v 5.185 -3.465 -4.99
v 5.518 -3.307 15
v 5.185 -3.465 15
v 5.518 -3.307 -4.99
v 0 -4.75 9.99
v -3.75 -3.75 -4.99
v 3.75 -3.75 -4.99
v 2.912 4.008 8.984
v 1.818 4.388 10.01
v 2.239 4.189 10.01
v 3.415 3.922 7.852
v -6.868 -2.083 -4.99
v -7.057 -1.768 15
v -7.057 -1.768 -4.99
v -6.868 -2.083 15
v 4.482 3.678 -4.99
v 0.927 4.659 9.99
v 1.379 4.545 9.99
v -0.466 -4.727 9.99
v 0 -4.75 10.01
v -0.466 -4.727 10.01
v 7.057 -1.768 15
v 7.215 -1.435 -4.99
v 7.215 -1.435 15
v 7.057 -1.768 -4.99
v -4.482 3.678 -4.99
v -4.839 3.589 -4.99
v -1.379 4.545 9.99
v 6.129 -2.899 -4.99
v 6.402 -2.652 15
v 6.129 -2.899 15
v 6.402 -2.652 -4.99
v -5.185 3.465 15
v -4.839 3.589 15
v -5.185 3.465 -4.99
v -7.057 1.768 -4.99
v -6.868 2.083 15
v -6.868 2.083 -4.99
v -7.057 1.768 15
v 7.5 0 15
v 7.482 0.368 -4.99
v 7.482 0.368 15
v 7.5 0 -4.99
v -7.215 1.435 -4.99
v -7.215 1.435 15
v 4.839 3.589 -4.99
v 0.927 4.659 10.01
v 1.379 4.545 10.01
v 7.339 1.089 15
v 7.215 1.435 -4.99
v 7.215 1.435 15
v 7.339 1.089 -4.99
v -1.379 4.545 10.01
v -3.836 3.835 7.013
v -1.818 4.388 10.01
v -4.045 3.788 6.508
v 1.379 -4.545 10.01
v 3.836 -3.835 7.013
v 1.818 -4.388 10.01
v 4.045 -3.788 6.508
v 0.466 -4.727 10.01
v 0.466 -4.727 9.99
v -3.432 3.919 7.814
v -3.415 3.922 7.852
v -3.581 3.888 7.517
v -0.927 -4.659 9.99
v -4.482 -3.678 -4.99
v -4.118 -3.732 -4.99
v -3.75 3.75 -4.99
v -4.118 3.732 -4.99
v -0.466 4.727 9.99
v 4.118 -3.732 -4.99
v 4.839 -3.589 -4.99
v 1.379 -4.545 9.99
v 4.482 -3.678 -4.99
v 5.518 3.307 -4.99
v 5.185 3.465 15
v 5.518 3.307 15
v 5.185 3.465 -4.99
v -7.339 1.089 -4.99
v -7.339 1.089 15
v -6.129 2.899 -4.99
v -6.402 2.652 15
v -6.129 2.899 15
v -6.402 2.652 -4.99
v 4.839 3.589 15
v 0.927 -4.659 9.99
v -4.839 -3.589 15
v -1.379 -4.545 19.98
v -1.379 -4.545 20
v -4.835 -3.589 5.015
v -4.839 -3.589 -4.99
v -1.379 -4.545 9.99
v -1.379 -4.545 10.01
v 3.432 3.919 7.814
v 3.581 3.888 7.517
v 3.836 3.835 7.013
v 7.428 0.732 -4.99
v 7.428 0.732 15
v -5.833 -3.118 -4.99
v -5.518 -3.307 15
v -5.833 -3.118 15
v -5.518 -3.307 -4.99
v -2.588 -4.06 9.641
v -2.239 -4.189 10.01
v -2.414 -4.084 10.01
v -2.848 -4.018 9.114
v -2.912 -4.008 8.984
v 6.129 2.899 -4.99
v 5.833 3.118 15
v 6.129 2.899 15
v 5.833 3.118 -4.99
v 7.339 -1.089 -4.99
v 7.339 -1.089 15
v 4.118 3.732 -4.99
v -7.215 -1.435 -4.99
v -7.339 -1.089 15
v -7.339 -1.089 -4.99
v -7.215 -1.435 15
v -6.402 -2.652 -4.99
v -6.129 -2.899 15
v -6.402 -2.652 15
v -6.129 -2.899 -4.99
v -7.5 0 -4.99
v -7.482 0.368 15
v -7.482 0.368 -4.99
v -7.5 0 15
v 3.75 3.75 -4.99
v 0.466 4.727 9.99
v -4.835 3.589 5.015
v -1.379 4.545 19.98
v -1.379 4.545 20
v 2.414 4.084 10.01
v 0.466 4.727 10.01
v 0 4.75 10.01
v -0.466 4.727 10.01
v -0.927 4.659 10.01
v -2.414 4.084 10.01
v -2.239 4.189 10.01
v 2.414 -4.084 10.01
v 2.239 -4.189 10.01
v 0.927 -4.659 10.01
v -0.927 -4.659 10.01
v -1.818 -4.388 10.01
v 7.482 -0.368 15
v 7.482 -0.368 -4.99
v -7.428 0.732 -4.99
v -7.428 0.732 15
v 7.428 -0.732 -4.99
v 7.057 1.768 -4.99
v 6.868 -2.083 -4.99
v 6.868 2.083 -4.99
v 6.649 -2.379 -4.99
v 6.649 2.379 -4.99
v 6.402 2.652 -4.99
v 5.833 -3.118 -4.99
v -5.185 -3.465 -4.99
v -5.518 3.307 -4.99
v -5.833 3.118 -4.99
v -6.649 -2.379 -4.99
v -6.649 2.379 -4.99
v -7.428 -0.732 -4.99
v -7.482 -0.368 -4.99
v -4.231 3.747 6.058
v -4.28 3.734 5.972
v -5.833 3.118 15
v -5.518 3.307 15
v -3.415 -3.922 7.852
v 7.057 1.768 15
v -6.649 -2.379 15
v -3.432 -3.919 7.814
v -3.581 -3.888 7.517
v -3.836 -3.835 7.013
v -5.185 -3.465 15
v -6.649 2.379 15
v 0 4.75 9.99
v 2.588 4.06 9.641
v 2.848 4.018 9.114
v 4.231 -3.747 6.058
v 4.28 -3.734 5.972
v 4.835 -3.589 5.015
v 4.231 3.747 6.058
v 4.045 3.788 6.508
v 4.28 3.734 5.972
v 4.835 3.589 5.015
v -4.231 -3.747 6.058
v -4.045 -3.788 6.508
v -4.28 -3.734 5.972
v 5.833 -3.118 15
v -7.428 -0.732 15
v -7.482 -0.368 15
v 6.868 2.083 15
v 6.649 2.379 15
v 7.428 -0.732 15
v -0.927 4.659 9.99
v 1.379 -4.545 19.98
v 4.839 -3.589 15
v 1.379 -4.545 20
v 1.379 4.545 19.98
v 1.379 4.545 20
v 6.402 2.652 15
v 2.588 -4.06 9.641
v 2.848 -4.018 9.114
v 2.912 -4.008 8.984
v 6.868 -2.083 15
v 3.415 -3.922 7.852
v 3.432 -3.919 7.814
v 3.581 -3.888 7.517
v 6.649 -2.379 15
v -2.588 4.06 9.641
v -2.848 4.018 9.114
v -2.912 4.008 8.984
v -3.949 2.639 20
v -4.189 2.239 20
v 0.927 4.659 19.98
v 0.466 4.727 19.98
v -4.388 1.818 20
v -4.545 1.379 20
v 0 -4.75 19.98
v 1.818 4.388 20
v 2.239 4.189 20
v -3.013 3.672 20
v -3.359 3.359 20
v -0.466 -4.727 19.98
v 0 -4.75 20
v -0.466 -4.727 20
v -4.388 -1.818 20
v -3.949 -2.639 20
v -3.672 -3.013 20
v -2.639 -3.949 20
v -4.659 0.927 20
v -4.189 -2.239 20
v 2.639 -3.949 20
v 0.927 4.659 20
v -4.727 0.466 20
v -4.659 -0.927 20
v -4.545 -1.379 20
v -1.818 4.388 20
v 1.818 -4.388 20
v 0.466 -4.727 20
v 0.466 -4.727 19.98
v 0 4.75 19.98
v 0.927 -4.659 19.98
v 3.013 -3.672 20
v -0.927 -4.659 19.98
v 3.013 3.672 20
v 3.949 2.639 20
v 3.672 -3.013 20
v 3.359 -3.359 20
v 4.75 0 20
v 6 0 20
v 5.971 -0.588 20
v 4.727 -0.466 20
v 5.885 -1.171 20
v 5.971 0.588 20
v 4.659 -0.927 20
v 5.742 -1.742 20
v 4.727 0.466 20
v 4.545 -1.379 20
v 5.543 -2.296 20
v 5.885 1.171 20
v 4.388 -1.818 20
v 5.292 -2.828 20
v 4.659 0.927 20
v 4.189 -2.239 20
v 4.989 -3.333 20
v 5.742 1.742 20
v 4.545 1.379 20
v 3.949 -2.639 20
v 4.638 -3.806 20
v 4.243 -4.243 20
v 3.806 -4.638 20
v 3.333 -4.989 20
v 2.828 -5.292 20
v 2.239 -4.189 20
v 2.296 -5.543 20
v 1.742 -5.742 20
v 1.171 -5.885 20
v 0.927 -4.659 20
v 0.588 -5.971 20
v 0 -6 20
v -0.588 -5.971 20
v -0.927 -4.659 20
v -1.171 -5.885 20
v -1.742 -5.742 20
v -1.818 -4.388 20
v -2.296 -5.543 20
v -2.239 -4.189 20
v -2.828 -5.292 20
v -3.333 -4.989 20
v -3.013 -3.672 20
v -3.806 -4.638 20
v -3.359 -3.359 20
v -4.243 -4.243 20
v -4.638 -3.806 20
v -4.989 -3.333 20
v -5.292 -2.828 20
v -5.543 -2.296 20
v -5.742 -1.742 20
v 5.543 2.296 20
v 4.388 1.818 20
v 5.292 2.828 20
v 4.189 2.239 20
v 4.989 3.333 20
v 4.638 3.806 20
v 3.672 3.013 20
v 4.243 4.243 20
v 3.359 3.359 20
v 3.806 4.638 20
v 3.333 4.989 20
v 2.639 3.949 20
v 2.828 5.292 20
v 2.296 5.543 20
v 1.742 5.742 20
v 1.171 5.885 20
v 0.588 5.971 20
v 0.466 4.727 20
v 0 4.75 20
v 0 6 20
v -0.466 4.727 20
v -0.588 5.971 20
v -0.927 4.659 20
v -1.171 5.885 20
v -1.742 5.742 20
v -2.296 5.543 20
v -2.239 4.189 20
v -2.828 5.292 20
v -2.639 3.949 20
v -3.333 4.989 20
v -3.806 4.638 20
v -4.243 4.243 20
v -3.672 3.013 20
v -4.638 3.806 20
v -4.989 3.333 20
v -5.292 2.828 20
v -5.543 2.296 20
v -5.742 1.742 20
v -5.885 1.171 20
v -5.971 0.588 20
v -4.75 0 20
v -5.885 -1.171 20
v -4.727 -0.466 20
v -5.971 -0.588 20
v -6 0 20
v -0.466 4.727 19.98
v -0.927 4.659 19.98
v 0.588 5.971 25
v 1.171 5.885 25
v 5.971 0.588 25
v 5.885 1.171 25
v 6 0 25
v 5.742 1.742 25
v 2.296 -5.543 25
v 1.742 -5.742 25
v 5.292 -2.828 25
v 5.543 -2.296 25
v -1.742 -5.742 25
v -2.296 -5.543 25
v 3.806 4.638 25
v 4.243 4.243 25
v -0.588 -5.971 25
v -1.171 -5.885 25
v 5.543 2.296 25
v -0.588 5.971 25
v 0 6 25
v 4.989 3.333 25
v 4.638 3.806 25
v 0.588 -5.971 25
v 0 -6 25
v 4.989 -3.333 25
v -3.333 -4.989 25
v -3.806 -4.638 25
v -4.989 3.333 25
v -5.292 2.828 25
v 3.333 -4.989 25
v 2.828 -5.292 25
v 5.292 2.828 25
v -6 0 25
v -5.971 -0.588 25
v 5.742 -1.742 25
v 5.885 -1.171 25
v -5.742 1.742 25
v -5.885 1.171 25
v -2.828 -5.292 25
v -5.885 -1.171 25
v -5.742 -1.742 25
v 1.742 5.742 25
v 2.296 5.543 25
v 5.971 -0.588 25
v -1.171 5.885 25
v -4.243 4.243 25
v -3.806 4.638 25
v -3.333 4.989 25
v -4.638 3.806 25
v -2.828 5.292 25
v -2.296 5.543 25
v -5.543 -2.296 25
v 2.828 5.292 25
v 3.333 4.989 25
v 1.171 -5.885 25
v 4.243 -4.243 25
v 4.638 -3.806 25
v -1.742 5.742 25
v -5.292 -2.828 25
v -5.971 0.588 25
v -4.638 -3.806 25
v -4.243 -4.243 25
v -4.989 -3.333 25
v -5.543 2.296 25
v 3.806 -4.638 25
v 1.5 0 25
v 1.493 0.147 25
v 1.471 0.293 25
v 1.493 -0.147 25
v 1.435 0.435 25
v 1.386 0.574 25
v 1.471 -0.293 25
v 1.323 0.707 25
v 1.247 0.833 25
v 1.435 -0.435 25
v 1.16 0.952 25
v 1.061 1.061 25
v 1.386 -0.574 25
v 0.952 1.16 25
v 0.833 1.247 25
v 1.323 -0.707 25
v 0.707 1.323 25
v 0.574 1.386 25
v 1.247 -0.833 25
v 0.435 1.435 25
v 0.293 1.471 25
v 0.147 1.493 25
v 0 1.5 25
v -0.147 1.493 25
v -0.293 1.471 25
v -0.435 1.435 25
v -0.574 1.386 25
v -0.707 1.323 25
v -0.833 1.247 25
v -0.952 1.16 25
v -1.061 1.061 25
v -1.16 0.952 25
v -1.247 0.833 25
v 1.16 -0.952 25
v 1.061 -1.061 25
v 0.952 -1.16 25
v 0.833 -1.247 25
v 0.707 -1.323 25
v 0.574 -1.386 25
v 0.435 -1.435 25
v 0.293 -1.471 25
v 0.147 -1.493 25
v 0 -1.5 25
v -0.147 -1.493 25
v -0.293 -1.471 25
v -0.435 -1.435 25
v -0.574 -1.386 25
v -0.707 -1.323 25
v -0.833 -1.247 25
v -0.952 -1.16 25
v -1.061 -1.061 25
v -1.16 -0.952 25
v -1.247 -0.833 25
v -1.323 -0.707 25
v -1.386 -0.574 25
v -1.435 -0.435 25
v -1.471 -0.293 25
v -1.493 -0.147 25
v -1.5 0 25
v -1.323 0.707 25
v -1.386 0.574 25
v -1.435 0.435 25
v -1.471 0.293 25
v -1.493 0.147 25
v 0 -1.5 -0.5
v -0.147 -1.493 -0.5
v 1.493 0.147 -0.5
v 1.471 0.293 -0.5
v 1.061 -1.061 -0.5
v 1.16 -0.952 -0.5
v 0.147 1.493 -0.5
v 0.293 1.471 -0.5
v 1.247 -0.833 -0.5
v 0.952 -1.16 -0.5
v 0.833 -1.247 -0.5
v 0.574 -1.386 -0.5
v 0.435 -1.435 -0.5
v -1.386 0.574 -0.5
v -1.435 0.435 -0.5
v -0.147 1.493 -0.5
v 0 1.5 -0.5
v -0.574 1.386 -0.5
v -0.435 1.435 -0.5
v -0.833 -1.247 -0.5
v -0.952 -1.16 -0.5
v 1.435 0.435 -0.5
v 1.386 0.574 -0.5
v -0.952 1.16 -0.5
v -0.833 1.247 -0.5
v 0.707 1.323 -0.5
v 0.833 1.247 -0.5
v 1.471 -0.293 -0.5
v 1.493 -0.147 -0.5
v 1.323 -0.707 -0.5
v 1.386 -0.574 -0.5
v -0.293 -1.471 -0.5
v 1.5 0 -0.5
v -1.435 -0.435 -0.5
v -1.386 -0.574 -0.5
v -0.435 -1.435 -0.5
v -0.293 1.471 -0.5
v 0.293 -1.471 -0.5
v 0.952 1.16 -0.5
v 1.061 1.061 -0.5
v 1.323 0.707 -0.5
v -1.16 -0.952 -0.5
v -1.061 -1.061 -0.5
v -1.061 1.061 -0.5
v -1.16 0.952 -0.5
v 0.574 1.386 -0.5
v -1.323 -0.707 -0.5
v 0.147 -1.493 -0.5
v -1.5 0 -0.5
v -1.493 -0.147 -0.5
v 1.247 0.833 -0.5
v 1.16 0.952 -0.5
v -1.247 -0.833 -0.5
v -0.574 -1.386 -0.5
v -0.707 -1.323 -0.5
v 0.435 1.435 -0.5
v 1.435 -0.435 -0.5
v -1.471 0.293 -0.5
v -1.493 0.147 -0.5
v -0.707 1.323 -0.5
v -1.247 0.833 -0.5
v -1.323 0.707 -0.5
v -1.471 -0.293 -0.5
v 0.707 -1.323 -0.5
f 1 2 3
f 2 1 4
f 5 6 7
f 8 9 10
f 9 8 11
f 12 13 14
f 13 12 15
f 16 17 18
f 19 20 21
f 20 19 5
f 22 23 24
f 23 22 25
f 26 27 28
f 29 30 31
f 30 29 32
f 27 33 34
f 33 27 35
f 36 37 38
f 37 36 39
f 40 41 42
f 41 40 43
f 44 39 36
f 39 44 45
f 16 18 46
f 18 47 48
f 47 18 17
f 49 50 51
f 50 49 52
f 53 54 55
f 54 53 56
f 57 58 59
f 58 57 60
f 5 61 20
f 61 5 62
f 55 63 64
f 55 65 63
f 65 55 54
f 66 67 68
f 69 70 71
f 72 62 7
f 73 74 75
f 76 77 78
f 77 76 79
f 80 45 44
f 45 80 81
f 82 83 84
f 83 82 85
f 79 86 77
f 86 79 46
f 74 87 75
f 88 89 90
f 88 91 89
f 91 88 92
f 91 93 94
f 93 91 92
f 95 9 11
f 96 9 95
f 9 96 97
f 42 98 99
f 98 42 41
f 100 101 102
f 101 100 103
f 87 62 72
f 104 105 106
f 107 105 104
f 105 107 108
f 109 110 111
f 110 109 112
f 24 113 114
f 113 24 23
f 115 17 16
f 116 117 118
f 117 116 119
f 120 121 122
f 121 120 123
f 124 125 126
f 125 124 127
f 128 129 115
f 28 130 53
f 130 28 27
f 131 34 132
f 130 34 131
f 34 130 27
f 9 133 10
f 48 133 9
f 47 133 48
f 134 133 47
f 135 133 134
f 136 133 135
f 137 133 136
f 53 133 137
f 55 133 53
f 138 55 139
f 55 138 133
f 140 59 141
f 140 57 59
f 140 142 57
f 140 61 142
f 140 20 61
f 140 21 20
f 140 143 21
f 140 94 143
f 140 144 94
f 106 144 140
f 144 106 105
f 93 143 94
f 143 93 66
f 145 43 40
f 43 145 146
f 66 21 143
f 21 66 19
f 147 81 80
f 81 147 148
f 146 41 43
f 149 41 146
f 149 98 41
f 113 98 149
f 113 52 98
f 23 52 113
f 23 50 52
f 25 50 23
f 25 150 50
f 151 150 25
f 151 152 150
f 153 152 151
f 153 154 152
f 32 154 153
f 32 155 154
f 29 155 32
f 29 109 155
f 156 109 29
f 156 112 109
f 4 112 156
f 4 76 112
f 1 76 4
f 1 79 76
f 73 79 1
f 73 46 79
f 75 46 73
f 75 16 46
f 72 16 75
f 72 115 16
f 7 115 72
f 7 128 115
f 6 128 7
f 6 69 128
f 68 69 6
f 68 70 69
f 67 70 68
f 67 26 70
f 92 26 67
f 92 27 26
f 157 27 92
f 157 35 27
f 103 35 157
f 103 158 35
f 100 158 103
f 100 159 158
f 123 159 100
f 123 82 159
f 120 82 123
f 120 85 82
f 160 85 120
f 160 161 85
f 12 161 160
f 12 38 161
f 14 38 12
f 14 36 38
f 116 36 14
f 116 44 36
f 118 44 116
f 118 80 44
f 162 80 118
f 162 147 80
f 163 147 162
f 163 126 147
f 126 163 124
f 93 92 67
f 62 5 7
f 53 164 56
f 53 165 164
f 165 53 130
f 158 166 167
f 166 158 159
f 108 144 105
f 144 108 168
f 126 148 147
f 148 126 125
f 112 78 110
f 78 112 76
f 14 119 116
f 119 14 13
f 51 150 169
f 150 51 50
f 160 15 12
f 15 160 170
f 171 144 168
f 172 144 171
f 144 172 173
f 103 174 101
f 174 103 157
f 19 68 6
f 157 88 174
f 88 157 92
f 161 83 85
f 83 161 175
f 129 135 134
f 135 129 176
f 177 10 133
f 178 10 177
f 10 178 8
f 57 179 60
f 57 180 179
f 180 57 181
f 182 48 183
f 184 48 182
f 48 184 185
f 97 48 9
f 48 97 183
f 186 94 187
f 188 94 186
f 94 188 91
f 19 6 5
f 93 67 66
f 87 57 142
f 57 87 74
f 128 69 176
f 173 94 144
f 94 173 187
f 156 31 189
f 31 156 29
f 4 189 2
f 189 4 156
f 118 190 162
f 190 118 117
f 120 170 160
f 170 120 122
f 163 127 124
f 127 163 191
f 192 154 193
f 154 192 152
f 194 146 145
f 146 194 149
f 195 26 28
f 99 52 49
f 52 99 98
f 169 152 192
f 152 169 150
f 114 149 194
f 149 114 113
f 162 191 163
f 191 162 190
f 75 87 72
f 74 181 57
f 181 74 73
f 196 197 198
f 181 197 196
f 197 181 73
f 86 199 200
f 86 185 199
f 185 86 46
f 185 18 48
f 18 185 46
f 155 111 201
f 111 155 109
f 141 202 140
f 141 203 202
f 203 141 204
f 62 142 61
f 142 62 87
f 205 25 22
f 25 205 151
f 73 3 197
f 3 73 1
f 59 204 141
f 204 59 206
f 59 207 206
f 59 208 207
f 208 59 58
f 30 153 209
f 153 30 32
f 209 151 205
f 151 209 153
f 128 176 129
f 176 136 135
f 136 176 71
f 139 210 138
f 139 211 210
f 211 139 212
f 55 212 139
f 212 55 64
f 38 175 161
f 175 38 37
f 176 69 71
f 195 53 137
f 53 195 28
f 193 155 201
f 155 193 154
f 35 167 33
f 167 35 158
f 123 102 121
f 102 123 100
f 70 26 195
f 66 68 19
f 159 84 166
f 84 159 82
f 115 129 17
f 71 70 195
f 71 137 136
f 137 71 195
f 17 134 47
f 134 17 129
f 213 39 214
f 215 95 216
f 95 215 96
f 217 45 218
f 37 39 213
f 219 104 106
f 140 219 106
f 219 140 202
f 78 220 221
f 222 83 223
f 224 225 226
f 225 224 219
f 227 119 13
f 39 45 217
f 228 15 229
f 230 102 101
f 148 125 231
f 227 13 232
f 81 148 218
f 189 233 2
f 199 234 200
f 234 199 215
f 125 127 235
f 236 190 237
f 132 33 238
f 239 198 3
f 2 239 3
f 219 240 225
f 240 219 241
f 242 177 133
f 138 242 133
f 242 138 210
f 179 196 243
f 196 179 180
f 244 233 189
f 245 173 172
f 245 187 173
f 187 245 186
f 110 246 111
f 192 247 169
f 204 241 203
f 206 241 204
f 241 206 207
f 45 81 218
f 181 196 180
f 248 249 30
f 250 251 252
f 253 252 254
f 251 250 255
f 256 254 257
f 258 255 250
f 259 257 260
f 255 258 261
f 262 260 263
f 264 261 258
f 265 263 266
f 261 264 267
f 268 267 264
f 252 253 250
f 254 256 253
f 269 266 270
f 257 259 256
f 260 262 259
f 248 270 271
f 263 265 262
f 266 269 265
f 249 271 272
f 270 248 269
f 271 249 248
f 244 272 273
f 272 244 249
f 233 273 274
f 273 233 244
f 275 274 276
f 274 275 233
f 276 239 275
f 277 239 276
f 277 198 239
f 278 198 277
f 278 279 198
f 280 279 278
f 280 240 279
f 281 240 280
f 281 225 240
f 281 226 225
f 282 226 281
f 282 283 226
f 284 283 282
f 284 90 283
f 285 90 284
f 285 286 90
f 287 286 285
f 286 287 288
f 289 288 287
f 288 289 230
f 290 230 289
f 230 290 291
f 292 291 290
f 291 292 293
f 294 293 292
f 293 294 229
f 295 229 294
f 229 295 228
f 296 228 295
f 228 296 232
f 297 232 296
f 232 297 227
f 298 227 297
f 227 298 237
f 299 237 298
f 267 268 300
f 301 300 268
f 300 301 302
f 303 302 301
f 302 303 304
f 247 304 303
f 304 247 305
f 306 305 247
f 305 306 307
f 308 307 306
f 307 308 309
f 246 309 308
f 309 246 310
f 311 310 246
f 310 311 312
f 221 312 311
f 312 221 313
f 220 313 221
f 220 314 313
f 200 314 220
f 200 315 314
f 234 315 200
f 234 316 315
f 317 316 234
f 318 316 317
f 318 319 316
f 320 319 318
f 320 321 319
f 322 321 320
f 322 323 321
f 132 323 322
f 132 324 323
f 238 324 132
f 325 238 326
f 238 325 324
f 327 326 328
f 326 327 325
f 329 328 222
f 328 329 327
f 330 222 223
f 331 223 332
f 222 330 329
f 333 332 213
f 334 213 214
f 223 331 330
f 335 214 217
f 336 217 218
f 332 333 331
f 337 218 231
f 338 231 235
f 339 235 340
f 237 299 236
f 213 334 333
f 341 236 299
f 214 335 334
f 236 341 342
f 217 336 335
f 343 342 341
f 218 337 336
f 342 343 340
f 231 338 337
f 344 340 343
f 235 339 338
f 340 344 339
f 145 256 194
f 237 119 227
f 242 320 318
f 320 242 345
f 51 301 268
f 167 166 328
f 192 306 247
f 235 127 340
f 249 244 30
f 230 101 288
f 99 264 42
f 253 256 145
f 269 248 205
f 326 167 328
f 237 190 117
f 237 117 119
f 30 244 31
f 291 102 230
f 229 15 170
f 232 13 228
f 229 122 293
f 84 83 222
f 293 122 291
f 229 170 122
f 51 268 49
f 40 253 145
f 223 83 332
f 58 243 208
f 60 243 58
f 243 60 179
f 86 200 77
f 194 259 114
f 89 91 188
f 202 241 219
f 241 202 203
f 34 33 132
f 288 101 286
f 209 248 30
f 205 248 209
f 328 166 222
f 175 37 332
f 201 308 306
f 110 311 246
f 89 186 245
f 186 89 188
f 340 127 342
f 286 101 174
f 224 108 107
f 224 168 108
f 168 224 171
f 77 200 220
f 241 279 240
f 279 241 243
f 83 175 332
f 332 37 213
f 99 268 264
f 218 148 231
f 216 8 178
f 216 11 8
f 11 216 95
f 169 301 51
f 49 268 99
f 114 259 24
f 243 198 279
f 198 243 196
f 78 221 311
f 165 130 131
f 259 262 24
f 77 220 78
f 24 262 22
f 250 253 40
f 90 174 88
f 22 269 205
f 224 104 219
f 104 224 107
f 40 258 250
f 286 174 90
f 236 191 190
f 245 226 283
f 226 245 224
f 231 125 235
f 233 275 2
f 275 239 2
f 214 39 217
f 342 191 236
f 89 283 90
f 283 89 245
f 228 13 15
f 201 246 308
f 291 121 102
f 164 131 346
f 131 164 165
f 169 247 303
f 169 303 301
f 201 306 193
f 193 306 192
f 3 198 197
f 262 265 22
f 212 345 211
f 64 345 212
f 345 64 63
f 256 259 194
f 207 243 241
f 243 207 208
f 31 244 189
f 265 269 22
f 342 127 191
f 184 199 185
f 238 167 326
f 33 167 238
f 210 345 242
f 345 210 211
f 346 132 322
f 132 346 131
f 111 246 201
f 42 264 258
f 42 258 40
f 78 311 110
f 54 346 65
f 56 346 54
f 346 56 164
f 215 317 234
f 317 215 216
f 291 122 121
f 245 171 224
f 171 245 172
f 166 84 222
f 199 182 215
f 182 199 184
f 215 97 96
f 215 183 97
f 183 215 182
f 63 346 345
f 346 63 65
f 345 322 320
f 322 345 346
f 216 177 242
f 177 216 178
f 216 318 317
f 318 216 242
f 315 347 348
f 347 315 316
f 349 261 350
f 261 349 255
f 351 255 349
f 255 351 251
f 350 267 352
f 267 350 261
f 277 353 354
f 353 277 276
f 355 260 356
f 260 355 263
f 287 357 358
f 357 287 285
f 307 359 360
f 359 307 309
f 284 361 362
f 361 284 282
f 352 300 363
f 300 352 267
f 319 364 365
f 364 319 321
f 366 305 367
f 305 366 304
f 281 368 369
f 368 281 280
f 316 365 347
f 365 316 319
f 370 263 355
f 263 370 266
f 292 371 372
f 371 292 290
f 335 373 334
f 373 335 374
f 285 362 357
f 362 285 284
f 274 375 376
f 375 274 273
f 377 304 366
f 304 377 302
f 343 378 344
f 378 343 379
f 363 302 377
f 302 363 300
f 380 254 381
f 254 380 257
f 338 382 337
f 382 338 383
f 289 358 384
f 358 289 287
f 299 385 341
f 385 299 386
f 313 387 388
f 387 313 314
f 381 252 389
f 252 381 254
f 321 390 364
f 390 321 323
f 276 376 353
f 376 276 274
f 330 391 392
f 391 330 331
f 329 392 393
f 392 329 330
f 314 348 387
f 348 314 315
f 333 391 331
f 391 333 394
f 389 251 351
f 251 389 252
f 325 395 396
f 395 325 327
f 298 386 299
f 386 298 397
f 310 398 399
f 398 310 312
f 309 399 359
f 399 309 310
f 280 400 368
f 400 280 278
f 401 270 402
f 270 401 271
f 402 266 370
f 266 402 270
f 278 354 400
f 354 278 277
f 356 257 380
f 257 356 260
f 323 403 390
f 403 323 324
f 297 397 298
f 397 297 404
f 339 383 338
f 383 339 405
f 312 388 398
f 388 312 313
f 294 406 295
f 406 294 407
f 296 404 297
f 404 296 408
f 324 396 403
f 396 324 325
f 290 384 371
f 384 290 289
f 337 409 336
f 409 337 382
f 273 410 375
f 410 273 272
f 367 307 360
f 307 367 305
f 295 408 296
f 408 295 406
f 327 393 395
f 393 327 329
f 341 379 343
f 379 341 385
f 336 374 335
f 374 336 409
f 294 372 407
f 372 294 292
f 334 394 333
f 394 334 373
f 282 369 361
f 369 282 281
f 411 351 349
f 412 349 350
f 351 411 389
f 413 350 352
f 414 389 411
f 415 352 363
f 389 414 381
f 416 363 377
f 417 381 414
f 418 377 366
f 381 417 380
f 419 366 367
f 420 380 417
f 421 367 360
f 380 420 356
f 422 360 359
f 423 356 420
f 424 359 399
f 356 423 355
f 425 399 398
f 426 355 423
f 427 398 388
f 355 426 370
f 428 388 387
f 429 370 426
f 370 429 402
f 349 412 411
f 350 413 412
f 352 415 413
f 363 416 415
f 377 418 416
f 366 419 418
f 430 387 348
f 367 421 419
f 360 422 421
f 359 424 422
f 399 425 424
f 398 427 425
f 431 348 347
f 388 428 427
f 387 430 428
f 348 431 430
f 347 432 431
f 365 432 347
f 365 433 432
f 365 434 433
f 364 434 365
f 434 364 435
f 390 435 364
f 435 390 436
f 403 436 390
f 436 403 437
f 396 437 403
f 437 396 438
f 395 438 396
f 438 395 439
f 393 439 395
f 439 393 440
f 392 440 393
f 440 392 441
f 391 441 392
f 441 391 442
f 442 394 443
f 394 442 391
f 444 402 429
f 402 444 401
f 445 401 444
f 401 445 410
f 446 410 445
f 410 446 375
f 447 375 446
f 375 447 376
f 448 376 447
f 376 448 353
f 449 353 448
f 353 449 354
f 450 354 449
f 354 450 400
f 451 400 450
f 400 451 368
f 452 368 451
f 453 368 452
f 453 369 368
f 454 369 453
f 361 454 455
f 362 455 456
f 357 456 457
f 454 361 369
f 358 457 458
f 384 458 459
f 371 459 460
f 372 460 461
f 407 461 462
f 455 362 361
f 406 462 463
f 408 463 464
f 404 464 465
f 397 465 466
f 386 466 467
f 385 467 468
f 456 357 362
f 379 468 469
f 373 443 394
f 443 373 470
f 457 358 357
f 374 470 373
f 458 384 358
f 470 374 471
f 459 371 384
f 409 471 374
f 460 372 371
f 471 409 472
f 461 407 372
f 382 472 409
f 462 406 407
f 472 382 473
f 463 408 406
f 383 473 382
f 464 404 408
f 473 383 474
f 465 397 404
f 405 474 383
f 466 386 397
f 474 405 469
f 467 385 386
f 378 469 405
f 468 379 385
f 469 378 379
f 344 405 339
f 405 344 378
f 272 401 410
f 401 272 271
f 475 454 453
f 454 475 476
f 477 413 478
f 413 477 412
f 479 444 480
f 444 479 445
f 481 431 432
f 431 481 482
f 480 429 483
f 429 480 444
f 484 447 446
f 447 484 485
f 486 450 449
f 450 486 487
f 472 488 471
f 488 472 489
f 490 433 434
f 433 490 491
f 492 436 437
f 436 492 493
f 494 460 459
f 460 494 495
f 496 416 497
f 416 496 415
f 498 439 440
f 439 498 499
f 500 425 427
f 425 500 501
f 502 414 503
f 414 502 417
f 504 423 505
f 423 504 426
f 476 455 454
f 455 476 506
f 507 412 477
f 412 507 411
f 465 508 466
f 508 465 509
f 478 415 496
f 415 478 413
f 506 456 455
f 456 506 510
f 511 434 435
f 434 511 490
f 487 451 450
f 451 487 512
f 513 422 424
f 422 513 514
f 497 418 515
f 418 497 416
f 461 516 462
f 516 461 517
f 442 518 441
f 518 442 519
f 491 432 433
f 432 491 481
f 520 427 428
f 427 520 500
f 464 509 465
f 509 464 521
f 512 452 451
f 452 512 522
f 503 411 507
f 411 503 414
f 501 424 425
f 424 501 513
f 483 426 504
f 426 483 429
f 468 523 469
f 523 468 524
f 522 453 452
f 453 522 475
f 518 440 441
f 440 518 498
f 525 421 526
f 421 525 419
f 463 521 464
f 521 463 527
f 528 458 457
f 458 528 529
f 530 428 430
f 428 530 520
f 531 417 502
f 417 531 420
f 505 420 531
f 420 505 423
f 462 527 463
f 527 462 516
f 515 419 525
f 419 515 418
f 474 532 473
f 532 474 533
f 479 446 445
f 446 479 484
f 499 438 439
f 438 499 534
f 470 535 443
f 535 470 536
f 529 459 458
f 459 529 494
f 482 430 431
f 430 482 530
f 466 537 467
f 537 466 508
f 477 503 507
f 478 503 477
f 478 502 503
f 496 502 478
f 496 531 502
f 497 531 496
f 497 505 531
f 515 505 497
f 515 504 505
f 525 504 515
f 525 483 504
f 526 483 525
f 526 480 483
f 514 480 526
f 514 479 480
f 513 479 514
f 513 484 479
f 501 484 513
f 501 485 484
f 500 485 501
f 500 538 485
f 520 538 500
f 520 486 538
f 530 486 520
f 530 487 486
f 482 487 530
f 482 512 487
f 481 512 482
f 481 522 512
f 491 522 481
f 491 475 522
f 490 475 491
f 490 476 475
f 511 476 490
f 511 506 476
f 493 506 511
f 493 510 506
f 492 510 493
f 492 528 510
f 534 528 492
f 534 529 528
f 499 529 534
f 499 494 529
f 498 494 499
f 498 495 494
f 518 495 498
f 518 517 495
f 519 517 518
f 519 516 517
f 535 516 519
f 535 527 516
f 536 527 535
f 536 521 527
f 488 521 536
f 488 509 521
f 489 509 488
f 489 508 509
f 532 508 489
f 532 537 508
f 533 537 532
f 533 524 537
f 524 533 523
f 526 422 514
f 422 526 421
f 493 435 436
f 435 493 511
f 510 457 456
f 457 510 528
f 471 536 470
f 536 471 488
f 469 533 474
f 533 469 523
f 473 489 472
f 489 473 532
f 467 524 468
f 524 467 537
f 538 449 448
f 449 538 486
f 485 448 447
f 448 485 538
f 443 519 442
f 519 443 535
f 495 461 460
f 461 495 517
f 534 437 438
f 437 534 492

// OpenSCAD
// Hose-barb reducer: 8 mm tubing (barbs) -> 5 mm tubing (barbs)
// Print orientation: standing upright along Z, centred on origin in X/Y

$fn = 64;

// ---- Dimensions (mm) ----
tube_d1      = 8;    // inner diameter of larger tubing
tube_d2      = 5;    // inner diameter of smaller tubing
bore_d       = 3;    // through-bore diameter
barb_h1      = 10;   // height of each 8 mm barb
barb_od1_bot = 7.5;  // outer diameter of 8 mm barb at bottom
barb_od1_top = 9.5;  // outer diameter of 8 mm barb at top
collar_d     = 12;   // collar diameter (z = 20 to 25)
barb_h2      = 8;    // height of each 5 mm barb
barb_od2_bot = 6.5;  // outer diameter of 5 mm barb at bottom
barb_od2_top = 5.0;  // outer diameter of 5 mm barb at top
eps          = 0.5;  // overlap for clean boolean cuts

// ---- Derived ----
z_barbs1 = 20;       // bottom of collar
z_barbs2 = 41;       // top of second barb set
overlap  = 0.01;     // small overlap between adjacent barbs

module barb1() {
    // Sawtooth profile in XZ, extruded around Z axis
    r_bot = barb_od1_bot / 2;
    r_top = barb_od1_top / 2;
    hull() {
        for (s = [-1, 1])
            translate([s * r_bot, 0, 0])
                linear_extrude(height = barb_h1, center = true)
                    circle(r = r_bot);
        translate([0, 0, barb_h1 - overlap])
            linear_extrude(height = overlap + 0.01, center = true)
                circle(r = r_top);
    }
}

module barb2() {
    // Shrinking sawtooth profile, stepped back out at the top
    r_bot = barb_od2_bot / 2;
    r_top = barb_od2_top / 2;
    hull() {
        for (s = [-1, 1])
            translate([s * r_bot, 0, 0])
                linear_extrude(height = barb_h2, center = true)
                    circle(r = r_bot);
        translate([0, 0, barb_h2])
            linear_extrude(height = 0.01, center = true)
                circle(r = r_top);
        translate([0, 0, barb_h2])
            linear_extrude(height = barb_h2 * 2 + 0.01, center = true)
                circle(r = r_bot);
    }
}

difference() {
    union() {
        for (i = [0, 1])
            translate([0, 0, i * (barb_h1 - overlap) + overlap])
                barb1();
        translate([0, 0, z_barbs1])
            cylinder(d = collar_d, h = 5);
        for (i = [0, 1])
            translate([0, 0, i * (barb_h2 - overlap) + overlap])
                barb2();
    }
    translate([0, 0, -eps])
        cylinder(d = bore_d, h = z_barbs2 + 2 * eps);
}
